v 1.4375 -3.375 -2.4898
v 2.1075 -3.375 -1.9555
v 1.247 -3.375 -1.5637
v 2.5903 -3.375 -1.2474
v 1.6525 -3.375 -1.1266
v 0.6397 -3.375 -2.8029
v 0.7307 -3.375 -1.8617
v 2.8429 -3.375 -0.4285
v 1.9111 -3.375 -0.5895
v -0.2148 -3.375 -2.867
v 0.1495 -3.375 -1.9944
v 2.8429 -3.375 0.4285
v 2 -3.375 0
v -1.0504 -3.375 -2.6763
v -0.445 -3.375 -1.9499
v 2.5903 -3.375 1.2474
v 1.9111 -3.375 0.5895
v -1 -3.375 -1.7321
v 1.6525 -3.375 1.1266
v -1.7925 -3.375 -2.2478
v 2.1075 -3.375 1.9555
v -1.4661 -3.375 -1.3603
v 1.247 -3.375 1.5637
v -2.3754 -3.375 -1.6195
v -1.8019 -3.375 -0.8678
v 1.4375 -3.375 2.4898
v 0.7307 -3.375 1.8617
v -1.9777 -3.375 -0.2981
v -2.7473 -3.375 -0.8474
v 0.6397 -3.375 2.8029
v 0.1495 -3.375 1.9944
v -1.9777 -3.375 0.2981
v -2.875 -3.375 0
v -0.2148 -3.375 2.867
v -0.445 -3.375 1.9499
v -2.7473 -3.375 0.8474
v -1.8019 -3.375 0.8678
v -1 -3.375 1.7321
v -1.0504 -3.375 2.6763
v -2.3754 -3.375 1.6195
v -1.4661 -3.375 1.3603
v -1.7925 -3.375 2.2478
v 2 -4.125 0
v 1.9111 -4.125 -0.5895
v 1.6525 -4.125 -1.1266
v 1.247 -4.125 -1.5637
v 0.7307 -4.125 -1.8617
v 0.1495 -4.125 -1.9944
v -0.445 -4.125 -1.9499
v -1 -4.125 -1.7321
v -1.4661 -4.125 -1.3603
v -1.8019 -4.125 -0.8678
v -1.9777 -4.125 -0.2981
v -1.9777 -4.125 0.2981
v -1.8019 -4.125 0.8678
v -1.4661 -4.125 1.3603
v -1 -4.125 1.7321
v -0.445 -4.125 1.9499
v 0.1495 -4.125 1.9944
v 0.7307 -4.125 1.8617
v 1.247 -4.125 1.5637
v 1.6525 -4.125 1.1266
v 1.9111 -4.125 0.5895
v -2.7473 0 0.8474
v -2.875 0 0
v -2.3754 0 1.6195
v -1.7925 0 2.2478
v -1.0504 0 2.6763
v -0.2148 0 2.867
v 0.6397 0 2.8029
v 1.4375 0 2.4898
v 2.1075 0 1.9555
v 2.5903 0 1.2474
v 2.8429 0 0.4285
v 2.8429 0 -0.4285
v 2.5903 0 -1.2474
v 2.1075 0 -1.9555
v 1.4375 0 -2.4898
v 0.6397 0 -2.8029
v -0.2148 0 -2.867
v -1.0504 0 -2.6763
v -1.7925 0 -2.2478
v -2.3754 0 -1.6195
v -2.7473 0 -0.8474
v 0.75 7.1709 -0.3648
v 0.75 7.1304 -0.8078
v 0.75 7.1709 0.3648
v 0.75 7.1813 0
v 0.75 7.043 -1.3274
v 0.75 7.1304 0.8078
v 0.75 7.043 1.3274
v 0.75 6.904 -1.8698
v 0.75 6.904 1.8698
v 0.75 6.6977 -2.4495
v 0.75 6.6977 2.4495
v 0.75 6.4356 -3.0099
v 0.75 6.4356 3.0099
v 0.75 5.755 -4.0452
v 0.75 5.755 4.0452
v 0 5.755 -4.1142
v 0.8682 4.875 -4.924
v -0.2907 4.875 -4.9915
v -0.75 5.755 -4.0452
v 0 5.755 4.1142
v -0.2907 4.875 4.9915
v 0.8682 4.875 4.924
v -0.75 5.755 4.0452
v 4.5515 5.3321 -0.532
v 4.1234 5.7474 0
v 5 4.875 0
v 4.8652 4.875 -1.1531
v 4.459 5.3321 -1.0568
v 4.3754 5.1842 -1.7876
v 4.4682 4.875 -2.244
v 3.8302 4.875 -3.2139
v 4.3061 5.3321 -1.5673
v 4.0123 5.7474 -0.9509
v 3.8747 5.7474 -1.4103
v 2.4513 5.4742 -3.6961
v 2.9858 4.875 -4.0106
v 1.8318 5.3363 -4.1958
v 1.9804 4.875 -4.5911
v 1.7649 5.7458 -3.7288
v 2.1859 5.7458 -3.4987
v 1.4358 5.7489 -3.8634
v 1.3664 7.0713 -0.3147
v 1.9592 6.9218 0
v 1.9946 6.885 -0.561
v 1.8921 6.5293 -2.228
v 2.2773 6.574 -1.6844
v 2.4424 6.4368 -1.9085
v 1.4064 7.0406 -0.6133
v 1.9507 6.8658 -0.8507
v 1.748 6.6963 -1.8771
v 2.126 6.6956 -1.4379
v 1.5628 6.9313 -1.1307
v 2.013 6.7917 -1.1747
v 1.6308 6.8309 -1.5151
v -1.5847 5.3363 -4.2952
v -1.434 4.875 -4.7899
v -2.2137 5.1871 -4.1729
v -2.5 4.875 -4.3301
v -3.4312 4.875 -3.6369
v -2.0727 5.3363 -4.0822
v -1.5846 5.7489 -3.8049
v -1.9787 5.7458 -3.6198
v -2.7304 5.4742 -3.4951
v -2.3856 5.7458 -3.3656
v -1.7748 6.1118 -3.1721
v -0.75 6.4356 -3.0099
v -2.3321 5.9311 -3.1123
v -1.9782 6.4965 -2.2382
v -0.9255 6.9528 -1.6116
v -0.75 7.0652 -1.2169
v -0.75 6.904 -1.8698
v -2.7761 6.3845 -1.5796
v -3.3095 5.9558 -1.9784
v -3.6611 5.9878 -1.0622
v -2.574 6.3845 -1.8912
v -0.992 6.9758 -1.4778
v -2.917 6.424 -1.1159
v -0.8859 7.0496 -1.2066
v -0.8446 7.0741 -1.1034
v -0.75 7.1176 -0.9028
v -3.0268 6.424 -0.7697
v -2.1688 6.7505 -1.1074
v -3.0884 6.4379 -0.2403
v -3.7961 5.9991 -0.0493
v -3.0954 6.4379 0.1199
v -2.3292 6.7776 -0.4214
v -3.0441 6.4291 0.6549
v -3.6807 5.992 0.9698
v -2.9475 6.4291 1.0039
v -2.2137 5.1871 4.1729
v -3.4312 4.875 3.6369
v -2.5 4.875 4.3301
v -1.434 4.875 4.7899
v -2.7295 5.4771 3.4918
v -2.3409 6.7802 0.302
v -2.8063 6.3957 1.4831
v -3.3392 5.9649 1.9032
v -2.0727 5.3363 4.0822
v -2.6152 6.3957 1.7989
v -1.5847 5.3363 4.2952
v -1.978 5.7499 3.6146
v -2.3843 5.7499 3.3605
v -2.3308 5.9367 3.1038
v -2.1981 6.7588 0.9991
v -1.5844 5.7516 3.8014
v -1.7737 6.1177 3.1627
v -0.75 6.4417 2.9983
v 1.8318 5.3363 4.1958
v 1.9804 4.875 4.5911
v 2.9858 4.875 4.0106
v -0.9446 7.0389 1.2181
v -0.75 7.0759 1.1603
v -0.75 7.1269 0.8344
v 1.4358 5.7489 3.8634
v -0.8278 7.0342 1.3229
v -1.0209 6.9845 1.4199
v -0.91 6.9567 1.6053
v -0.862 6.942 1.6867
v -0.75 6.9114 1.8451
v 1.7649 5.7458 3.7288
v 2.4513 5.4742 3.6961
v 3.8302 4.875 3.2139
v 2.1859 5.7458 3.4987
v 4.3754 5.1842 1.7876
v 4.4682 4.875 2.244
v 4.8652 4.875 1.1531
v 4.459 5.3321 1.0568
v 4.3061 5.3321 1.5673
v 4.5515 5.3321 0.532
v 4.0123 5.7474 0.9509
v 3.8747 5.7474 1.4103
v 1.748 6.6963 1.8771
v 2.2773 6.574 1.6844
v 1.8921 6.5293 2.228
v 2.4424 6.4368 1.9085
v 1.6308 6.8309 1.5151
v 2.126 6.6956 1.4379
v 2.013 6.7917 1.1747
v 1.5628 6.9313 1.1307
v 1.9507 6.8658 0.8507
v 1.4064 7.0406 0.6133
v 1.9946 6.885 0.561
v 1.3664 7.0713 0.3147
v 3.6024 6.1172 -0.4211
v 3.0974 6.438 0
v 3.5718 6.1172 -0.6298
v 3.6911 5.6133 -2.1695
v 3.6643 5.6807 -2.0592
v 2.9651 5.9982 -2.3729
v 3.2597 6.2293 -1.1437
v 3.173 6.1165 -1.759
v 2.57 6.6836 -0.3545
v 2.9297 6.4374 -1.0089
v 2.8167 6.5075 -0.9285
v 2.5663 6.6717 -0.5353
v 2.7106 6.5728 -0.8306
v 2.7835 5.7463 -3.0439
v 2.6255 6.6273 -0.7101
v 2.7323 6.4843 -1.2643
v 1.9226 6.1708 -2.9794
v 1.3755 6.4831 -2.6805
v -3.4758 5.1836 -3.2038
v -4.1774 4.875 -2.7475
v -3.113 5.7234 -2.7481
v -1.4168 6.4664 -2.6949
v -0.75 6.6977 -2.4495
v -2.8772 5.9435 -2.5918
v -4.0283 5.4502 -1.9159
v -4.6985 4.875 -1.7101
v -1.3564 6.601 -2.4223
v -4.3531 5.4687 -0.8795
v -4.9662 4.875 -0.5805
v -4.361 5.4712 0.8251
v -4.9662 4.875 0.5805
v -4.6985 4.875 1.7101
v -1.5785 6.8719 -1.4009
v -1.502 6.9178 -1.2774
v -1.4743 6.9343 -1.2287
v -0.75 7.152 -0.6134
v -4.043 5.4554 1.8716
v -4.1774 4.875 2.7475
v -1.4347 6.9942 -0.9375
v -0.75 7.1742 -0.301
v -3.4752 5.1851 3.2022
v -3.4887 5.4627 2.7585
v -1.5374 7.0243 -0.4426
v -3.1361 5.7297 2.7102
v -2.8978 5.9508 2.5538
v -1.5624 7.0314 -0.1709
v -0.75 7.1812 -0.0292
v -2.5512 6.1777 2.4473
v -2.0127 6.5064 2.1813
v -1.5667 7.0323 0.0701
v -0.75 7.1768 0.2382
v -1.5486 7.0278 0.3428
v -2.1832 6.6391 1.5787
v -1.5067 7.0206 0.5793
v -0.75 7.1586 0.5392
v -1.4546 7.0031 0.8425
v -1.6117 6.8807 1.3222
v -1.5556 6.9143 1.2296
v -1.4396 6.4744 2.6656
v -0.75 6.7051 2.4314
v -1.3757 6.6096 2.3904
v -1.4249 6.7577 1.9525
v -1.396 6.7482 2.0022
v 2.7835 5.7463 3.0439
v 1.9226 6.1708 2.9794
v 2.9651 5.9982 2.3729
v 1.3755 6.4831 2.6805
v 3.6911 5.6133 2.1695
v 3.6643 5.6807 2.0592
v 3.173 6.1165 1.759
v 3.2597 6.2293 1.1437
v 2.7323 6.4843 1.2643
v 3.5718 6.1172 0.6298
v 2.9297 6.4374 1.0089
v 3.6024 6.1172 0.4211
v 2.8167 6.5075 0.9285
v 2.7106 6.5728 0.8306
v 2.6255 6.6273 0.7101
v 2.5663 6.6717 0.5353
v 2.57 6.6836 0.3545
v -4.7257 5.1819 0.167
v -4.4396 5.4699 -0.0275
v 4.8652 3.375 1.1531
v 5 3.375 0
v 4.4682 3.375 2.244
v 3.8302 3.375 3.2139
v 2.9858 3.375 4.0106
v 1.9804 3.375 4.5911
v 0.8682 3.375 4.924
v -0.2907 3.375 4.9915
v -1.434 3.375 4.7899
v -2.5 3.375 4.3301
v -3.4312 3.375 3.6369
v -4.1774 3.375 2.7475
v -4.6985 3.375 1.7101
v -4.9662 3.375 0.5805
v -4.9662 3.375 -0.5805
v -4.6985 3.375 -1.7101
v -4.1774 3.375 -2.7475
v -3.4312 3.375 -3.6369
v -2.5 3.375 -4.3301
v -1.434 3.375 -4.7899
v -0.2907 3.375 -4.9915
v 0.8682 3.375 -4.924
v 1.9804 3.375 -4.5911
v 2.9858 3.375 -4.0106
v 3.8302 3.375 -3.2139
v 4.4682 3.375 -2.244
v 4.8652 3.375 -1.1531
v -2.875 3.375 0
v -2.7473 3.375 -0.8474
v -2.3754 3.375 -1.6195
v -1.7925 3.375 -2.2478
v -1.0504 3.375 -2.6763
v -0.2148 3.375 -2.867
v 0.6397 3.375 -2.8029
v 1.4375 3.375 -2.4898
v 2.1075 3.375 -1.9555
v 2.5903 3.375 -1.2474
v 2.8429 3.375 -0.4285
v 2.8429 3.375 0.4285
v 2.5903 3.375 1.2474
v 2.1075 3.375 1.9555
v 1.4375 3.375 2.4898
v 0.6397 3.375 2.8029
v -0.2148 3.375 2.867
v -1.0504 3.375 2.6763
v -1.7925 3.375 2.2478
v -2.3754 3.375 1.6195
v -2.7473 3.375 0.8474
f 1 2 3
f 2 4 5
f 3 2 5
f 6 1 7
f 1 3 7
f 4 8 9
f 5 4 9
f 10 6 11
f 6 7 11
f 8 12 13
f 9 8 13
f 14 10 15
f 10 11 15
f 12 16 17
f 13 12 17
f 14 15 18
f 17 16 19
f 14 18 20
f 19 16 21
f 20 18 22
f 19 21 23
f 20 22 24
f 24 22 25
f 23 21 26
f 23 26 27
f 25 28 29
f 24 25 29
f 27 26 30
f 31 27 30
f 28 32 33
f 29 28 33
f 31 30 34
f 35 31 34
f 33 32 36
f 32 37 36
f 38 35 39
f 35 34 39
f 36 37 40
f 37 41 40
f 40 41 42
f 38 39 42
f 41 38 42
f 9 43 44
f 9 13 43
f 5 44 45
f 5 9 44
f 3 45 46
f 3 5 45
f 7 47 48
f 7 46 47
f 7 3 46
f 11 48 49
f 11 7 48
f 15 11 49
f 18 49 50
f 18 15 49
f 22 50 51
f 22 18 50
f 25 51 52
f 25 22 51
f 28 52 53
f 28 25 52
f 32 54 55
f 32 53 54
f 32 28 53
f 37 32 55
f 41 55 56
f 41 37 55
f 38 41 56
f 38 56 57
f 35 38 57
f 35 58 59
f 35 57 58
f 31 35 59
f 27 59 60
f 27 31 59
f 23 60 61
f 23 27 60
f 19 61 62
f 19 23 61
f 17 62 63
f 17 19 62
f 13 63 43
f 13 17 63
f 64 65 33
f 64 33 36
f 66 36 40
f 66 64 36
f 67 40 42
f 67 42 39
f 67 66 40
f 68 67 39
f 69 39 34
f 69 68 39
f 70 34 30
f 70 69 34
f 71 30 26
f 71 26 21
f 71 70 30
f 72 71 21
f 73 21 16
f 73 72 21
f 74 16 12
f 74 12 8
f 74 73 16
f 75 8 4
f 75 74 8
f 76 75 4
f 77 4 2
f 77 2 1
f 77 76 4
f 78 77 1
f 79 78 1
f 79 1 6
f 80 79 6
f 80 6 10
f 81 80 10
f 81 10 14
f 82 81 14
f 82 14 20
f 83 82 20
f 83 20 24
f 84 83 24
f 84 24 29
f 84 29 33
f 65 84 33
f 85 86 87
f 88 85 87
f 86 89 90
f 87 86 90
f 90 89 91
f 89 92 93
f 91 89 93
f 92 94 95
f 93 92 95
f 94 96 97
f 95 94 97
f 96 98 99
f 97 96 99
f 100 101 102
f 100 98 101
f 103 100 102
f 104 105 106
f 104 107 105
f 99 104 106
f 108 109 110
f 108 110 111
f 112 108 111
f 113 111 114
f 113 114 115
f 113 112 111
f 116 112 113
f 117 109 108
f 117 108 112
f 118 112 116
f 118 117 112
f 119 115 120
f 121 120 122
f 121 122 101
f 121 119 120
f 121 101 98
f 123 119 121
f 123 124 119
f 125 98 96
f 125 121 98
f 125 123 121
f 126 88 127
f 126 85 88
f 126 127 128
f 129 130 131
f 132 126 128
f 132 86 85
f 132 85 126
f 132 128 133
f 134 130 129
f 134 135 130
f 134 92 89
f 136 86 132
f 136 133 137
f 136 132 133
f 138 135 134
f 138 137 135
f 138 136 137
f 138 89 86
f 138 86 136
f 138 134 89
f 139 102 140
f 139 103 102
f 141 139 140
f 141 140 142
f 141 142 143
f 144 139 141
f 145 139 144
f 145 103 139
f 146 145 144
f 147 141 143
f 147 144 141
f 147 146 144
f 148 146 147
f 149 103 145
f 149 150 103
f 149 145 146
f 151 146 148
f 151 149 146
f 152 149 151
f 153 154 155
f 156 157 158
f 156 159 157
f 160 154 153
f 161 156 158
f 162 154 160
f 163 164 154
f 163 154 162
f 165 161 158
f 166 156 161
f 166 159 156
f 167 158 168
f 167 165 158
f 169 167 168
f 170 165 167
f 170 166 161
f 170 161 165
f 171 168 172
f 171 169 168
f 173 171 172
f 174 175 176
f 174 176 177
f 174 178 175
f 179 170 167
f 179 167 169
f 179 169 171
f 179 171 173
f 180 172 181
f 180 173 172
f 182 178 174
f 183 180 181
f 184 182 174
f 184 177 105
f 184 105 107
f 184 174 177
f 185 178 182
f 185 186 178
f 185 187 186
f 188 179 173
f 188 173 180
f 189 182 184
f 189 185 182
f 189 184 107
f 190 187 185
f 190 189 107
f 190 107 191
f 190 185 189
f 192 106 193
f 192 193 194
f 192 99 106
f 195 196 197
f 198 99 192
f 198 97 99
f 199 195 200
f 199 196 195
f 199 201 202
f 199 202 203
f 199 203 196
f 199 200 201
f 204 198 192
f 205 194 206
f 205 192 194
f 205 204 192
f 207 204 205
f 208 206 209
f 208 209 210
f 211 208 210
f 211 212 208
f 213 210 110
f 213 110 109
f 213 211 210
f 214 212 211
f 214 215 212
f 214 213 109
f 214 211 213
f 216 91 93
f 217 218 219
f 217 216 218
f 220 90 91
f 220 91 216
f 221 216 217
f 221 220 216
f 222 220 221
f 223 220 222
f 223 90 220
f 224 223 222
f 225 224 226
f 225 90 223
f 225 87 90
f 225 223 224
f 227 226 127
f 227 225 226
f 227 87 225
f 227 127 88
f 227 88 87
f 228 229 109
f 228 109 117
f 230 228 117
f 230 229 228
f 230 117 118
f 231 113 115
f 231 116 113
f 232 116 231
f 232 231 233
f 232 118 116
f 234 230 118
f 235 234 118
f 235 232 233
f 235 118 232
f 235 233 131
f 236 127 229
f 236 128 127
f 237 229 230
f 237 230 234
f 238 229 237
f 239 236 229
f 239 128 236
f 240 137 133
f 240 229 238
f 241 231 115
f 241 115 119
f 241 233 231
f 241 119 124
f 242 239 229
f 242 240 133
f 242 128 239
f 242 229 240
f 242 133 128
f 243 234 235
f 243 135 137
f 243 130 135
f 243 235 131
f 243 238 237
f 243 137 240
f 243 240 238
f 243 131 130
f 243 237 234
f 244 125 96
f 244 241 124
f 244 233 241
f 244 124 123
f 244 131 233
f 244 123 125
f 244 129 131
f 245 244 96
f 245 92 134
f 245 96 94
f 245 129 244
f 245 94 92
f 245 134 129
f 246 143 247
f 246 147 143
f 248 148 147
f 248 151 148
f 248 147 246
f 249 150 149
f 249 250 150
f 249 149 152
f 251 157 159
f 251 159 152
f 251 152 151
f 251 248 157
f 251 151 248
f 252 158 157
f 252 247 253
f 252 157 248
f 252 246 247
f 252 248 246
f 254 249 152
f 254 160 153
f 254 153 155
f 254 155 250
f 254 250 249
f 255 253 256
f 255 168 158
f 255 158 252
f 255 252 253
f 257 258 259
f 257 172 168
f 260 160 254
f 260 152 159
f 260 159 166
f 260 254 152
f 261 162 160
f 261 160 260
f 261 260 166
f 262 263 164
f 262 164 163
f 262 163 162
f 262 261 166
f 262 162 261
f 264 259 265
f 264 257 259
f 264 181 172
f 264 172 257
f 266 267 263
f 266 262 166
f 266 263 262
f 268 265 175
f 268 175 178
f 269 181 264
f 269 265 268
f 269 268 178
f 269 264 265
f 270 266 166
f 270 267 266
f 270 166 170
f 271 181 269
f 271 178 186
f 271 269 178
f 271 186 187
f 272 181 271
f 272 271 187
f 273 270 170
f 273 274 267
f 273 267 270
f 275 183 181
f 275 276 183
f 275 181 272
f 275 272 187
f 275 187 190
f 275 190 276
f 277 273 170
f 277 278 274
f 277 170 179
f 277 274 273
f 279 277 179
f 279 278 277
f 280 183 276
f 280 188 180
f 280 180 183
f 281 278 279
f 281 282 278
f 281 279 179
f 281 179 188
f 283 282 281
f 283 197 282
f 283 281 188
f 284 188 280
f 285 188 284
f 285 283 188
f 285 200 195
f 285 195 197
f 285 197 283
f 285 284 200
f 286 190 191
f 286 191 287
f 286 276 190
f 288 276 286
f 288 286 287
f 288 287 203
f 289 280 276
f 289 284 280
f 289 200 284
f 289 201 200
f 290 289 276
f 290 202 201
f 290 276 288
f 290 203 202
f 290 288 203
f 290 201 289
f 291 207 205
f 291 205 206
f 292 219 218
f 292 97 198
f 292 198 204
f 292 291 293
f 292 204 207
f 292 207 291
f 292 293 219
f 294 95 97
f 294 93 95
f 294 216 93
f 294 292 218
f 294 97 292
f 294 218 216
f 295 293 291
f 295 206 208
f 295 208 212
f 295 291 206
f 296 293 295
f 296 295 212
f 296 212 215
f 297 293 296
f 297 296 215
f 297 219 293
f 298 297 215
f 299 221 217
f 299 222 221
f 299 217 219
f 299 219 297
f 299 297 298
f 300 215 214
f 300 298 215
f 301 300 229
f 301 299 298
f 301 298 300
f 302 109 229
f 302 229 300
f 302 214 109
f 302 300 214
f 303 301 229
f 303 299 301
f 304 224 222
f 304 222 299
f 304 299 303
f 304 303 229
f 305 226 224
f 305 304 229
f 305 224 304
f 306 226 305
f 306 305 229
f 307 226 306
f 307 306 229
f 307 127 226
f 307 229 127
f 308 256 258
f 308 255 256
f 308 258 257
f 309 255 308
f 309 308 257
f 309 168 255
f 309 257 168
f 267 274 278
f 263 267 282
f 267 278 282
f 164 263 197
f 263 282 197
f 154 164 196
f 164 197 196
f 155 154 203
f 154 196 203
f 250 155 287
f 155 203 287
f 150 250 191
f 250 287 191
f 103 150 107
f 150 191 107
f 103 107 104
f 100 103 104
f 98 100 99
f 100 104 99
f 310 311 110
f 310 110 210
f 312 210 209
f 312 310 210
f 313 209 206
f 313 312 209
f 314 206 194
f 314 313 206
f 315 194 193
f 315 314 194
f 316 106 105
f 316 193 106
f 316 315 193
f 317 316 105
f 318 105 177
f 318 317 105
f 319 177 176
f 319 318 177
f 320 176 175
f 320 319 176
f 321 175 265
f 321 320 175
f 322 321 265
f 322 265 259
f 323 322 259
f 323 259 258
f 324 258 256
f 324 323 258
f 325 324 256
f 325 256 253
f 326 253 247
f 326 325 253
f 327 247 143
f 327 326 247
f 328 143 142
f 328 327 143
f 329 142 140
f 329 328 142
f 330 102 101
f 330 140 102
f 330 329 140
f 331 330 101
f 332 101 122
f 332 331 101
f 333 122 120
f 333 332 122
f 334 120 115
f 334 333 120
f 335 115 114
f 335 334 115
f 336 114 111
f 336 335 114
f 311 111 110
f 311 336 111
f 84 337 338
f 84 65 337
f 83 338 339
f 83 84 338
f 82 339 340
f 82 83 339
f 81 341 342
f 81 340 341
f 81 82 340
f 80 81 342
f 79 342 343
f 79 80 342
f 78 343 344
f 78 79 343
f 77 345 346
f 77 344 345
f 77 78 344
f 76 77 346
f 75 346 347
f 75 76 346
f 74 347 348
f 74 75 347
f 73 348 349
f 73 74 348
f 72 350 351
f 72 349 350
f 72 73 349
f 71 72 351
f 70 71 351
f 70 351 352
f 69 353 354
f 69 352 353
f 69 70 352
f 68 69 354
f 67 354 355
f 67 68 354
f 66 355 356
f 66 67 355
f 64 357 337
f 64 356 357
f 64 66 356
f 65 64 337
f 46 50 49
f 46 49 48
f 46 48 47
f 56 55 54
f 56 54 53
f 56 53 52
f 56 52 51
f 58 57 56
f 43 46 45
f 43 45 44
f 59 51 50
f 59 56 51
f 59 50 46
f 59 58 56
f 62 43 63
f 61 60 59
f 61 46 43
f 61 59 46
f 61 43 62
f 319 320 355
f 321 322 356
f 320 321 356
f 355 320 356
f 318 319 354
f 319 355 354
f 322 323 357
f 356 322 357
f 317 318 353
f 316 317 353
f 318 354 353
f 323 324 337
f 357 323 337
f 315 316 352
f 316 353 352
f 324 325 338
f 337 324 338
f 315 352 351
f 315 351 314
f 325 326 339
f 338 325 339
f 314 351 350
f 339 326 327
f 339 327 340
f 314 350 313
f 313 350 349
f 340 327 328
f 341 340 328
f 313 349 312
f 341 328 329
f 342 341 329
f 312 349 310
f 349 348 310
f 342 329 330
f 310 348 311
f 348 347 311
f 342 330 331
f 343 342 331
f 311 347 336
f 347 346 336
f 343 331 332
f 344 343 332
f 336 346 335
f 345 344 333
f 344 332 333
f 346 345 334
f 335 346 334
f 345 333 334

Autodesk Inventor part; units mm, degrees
ref_plane "YZ Plane" through (0, 0, 0) normal (1, 0, 0) x (0, 1, 0)
ref_plane "XZ Plane" through (0, 0, 0) normal (0, 1, 0) x (-1, 0, 0)
ref_plane "XY Plane" through (0, 0, 0) normal (0, 0, 1) x (1, 0, 0)
sketch "Sketch1" plane through (0, 0, 0) normal (0, 1, 0) x (-1, 0, 0)
  circle A0 centre (0, 0) radius 2.875
  dimension "d0" = 5.75
extrude "Extrusion1" add sketch "Sketch1" along normal mid plane 6.75
sketch "Sketch2" plane through (0, -3.375, 0) normal (0, -1, 0) x (1, 0, 0)
  circle A0 centre (0, 0) radius 2
  dimension "d3" = 4
extrude "Extrusion2" add sketch "Sketch2" along normal blind 0.75
sketch "Sketch3" plane through (0, 3.375, 0) normal (0, 1, 0) x (1, 0, 0)
  circle A0 centre (0, 0) radius 5
  dimension "d6" = 10
extrude "Extrusion3" add sketch "Sketch3" along normal blind 1.5
sketch "Sketch5" plane through (0, 0, 0) normal (0, 0, 1) x (1, 0, 0)
  line L0 (5, 4.875) -> (-5, 4.875) projected
  line L1 (0, 4.875) -> (0, 7.225)
  line L2 (0, 4.875) -> (5, 4.875)
  arc A0 (5, 4.875) -> (0, 7.225) centre (-0.0027, 0.725) ccw
  line L3 (0, 4.875) -> (0, 12.9944) construction
  point P0 (0, 0)
  dimension "d9" = 2.35
  dimension "d10" = 6.5
revolve "Revolution1" add sketch "Sketch5" angle 360 about axis through (0, 4.875, 0) along (0, 1, 0)
sketch "Sketch6" plane through (0, 0, 0) normal (0, 0, 1) x (1, 0, 0)
  line L0 (5, 4.875) -> (-5, 4.875) projected
  line L1 (0, 5.755) -> (0.75, 5.755)
  line L2 (0.75, 5.755) -> (0.75, 8.519)
  line L3 (0.75, 8.519) -> (-0.75, 8.519)
  line L4 (-0.75, 8.519) -> (-0.75, 5.755)
  line L5 (-0.75, 5.755) -> (0, 5.755)
  point P0 (0, 0)
  dimension "d13" = 0.75
  dimension "d14" = 1.5
extrude "Extrusion4" cut sketch "Sketch6" against normal mid plane 15
properties part number "Pieza 1 KAS" material "Steel, Galvanized"
